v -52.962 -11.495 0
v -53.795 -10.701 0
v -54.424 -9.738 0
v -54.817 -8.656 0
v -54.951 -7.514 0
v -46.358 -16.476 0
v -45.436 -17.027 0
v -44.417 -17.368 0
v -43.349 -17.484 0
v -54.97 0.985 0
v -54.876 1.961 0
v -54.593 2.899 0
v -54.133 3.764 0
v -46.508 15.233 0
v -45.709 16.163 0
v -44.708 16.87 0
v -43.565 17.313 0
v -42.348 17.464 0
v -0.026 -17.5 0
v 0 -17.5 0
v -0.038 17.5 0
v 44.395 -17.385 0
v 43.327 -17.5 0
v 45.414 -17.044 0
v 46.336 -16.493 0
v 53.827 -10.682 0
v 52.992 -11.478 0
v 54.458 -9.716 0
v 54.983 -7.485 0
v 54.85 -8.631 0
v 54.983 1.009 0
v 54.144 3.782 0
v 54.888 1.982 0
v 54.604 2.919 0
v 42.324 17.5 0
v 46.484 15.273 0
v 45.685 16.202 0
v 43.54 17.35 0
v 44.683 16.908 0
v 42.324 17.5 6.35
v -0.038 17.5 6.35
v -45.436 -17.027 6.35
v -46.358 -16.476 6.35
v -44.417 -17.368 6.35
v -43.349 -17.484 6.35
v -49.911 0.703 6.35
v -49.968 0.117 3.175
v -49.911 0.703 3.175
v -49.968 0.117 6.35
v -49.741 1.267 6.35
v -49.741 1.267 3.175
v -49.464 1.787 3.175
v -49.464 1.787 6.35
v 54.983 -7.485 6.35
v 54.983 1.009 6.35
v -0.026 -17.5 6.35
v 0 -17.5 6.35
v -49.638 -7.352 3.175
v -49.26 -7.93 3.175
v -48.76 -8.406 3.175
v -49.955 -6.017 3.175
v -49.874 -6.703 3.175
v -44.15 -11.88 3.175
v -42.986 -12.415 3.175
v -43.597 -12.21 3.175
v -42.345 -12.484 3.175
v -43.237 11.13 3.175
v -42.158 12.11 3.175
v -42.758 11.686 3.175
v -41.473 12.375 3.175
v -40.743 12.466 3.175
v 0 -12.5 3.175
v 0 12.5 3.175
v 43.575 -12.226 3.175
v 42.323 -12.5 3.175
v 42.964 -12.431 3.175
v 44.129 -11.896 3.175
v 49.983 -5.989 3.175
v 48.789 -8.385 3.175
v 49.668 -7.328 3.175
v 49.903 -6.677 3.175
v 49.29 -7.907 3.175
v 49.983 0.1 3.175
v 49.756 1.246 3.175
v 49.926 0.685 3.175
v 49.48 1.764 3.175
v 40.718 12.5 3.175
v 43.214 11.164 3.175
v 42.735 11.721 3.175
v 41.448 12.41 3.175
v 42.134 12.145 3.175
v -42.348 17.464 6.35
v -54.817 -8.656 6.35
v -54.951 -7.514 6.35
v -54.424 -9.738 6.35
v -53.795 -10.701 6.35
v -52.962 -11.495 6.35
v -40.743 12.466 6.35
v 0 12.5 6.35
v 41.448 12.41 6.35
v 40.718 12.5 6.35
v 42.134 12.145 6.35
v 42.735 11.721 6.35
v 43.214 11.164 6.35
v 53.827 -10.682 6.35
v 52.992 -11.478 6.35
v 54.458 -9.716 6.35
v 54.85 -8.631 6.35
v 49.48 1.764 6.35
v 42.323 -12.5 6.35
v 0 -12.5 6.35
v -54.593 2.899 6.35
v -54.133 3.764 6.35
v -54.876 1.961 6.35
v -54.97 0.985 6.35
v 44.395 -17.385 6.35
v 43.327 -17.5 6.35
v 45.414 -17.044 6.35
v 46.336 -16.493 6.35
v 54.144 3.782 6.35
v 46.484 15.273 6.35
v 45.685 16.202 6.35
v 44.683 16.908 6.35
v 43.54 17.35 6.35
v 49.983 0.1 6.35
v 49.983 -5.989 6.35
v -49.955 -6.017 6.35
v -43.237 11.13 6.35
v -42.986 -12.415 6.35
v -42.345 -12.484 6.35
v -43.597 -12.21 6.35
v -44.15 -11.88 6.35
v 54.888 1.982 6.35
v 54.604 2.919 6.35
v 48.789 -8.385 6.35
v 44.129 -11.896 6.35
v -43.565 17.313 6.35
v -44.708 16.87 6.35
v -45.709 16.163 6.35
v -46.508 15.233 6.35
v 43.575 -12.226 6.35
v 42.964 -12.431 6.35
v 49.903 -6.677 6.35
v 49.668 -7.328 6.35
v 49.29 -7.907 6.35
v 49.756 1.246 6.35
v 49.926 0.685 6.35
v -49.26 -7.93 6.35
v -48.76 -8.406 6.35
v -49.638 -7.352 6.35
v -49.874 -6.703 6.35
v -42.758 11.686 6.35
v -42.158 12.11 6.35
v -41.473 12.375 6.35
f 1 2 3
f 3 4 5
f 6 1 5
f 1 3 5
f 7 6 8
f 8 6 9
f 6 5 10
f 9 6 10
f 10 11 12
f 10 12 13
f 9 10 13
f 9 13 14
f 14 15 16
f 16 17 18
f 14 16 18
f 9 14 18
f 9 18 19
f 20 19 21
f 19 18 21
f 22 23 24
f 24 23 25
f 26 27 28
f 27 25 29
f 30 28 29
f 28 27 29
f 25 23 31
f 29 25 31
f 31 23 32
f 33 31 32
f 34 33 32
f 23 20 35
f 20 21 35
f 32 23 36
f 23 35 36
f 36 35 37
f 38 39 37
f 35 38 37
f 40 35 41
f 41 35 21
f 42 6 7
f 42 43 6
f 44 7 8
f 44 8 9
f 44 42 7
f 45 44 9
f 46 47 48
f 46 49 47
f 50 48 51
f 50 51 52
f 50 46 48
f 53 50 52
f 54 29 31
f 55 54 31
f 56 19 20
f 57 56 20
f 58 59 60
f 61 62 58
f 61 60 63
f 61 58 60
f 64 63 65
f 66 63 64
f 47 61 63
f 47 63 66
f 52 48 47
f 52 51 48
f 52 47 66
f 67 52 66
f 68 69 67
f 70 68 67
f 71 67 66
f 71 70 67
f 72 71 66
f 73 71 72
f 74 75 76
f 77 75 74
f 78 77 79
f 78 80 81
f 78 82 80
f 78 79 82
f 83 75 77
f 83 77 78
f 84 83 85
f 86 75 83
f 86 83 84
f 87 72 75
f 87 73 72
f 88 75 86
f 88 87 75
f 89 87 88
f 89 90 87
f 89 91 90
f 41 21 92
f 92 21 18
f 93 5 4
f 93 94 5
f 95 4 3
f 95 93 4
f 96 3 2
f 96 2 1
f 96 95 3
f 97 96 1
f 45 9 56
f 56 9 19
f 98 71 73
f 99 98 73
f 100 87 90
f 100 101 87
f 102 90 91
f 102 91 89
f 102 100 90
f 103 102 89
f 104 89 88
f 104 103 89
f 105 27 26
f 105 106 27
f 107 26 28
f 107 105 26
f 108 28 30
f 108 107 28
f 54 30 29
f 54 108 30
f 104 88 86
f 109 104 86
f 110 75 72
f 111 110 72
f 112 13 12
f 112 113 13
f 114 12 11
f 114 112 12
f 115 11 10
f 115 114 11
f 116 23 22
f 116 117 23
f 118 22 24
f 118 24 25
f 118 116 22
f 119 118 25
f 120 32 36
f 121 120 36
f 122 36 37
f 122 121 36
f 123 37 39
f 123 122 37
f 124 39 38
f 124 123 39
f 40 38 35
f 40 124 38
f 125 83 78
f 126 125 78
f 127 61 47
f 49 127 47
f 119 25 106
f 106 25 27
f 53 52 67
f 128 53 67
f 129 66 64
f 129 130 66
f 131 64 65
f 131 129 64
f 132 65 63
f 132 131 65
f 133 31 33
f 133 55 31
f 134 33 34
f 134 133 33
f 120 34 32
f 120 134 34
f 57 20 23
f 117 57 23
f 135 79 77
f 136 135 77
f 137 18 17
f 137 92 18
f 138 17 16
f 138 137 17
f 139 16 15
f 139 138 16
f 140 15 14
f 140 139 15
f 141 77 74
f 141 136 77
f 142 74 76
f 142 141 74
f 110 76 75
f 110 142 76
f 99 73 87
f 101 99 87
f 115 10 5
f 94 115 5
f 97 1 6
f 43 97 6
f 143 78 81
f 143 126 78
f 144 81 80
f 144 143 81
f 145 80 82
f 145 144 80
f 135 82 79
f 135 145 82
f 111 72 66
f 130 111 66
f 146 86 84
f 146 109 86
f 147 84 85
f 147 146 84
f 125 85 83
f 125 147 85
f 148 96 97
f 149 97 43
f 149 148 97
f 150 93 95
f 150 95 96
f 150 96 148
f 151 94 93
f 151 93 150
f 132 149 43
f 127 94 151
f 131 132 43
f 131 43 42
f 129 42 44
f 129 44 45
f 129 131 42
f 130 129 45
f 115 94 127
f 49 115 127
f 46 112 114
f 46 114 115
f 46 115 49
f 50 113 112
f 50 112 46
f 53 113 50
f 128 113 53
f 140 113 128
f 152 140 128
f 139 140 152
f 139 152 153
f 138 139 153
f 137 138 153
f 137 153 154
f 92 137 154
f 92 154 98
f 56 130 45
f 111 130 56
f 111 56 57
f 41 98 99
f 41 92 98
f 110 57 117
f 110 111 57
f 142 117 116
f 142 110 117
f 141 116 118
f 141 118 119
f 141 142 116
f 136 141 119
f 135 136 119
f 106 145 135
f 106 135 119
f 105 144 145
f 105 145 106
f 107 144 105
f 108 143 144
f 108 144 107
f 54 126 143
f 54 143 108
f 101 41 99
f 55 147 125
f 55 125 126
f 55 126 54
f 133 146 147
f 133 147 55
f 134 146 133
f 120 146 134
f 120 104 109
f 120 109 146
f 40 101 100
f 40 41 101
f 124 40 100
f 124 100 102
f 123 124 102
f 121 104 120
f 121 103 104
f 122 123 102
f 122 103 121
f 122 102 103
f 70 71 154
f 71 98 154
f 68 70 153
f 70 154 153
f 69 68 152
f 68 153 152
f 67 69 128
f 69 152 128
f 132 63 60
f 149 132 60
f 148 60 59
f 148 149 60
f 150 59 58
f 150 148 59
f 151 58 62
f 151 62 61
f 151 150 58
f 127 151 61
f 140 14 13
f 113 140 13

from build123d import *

# Parameters (mm, degrees)
F1_DEPTH = 6.35
F2_DEPTH = 3.175
F3_R     = 5
F4_R     = 3


# Not quite as in the source:
# - ends of sketch curves that miss each other by under 0.0002 mm in the source are joined
# - a feature names something its author has since deleted; it is built from what else it names


with BuildPart() as f1:
    # F0 (on Top) → F1 (new body)
    with BuildSketch(Plane.XY):
        Polygon((0, 12.50001), (0, 17.5), (-0.0375035219, 17.5), (-45.0252224641, 17.4621137515), (-54.9730516553, 2.5016534816), (-54.9460702886, -9.9983173986), (-45.0221895285, -17.4832638625), (-0.0259340823, -17.4999907076), (0, -17.5), (0, -12.50001), (-43.3485360617, -12.4839008237), (-49.9514424363, -7.508736751), (-49.9698707033, 1.0287403501), (-42.3475575474, 12.4643751943), align=None)
        Polygon((54.9832946886, 2.5222222222), (45, 17.5), (0, 17.5), (0, 12.50001), (42.3238055081, 12.50001), (49.9833046886, 1.0085855561), (49.9833046886, -7.4847291513), (43.3271563883, -12.50001), (0, -12.50001), (0, -17.5), (45, -17.5), (54.9832946886, -9.9777777778), align=None)
    extrude(amount=F1_DEPTH)

    # F0 (on Top) → F2 (join)
    with BuildSketch(Plane.XY):
        Polygon((0, -12.50001), (0, 12.50001), (-42.3475575474, 12.4643751943), (-49.9698707033, 1.0287403501), (-49.9514424363, -7.508736751), (-43.3485360617, -12.4839008237), align=None)
        Polygon((42.3238055081, 12.50001), (0, 12.50001), (0, -12.50001), (43.3271563883, -12.50001), (49.9833046886, -7.4847291513), (49.9833046886, 1.0085855561), align=None)
    extrude(amount=F2_DEPTH)

    # F3
    f3_edges = [f1.edges().sort_by_distance(p)[0] for p in [
        (-45.02219, -17.483264, 3.175),
        (-45.025222, 17.462114, 3.175),
        (45, 17.5, 3.175),
        (54.983295, 2.522222, 3.175),
        (54.983295, -9.977778, 3.175),
        (45, -17.5, 3.175),
        (-54.973052, 2.501653, 3.175),
        (-54.94607, -9.998317, 3.175),
    ]]
    fillet(f3_edges, radius=F3_R)

    # F4
    f4_edges = [f1.edges().sort_by_distance(p)[0] for p in [
        (-42.347558, 12.464375, 4.7625),
        (-49.969871, 1.02874, 4.7625),
        (-49.951442, -7.508737, 4.7625),
        (-43.348536, -12.483901, 4.7625),
        (43.327156, -12.50001, 4.7625),
        (49.983305, -7.484729, 4.7625),
        (49.983305, 1.008586, 4.7625),
        (42.323806, 12.50001, 4.7625),
    ]]
    fillet(f4_edges, radius=F4_R)


solid = f1.part
